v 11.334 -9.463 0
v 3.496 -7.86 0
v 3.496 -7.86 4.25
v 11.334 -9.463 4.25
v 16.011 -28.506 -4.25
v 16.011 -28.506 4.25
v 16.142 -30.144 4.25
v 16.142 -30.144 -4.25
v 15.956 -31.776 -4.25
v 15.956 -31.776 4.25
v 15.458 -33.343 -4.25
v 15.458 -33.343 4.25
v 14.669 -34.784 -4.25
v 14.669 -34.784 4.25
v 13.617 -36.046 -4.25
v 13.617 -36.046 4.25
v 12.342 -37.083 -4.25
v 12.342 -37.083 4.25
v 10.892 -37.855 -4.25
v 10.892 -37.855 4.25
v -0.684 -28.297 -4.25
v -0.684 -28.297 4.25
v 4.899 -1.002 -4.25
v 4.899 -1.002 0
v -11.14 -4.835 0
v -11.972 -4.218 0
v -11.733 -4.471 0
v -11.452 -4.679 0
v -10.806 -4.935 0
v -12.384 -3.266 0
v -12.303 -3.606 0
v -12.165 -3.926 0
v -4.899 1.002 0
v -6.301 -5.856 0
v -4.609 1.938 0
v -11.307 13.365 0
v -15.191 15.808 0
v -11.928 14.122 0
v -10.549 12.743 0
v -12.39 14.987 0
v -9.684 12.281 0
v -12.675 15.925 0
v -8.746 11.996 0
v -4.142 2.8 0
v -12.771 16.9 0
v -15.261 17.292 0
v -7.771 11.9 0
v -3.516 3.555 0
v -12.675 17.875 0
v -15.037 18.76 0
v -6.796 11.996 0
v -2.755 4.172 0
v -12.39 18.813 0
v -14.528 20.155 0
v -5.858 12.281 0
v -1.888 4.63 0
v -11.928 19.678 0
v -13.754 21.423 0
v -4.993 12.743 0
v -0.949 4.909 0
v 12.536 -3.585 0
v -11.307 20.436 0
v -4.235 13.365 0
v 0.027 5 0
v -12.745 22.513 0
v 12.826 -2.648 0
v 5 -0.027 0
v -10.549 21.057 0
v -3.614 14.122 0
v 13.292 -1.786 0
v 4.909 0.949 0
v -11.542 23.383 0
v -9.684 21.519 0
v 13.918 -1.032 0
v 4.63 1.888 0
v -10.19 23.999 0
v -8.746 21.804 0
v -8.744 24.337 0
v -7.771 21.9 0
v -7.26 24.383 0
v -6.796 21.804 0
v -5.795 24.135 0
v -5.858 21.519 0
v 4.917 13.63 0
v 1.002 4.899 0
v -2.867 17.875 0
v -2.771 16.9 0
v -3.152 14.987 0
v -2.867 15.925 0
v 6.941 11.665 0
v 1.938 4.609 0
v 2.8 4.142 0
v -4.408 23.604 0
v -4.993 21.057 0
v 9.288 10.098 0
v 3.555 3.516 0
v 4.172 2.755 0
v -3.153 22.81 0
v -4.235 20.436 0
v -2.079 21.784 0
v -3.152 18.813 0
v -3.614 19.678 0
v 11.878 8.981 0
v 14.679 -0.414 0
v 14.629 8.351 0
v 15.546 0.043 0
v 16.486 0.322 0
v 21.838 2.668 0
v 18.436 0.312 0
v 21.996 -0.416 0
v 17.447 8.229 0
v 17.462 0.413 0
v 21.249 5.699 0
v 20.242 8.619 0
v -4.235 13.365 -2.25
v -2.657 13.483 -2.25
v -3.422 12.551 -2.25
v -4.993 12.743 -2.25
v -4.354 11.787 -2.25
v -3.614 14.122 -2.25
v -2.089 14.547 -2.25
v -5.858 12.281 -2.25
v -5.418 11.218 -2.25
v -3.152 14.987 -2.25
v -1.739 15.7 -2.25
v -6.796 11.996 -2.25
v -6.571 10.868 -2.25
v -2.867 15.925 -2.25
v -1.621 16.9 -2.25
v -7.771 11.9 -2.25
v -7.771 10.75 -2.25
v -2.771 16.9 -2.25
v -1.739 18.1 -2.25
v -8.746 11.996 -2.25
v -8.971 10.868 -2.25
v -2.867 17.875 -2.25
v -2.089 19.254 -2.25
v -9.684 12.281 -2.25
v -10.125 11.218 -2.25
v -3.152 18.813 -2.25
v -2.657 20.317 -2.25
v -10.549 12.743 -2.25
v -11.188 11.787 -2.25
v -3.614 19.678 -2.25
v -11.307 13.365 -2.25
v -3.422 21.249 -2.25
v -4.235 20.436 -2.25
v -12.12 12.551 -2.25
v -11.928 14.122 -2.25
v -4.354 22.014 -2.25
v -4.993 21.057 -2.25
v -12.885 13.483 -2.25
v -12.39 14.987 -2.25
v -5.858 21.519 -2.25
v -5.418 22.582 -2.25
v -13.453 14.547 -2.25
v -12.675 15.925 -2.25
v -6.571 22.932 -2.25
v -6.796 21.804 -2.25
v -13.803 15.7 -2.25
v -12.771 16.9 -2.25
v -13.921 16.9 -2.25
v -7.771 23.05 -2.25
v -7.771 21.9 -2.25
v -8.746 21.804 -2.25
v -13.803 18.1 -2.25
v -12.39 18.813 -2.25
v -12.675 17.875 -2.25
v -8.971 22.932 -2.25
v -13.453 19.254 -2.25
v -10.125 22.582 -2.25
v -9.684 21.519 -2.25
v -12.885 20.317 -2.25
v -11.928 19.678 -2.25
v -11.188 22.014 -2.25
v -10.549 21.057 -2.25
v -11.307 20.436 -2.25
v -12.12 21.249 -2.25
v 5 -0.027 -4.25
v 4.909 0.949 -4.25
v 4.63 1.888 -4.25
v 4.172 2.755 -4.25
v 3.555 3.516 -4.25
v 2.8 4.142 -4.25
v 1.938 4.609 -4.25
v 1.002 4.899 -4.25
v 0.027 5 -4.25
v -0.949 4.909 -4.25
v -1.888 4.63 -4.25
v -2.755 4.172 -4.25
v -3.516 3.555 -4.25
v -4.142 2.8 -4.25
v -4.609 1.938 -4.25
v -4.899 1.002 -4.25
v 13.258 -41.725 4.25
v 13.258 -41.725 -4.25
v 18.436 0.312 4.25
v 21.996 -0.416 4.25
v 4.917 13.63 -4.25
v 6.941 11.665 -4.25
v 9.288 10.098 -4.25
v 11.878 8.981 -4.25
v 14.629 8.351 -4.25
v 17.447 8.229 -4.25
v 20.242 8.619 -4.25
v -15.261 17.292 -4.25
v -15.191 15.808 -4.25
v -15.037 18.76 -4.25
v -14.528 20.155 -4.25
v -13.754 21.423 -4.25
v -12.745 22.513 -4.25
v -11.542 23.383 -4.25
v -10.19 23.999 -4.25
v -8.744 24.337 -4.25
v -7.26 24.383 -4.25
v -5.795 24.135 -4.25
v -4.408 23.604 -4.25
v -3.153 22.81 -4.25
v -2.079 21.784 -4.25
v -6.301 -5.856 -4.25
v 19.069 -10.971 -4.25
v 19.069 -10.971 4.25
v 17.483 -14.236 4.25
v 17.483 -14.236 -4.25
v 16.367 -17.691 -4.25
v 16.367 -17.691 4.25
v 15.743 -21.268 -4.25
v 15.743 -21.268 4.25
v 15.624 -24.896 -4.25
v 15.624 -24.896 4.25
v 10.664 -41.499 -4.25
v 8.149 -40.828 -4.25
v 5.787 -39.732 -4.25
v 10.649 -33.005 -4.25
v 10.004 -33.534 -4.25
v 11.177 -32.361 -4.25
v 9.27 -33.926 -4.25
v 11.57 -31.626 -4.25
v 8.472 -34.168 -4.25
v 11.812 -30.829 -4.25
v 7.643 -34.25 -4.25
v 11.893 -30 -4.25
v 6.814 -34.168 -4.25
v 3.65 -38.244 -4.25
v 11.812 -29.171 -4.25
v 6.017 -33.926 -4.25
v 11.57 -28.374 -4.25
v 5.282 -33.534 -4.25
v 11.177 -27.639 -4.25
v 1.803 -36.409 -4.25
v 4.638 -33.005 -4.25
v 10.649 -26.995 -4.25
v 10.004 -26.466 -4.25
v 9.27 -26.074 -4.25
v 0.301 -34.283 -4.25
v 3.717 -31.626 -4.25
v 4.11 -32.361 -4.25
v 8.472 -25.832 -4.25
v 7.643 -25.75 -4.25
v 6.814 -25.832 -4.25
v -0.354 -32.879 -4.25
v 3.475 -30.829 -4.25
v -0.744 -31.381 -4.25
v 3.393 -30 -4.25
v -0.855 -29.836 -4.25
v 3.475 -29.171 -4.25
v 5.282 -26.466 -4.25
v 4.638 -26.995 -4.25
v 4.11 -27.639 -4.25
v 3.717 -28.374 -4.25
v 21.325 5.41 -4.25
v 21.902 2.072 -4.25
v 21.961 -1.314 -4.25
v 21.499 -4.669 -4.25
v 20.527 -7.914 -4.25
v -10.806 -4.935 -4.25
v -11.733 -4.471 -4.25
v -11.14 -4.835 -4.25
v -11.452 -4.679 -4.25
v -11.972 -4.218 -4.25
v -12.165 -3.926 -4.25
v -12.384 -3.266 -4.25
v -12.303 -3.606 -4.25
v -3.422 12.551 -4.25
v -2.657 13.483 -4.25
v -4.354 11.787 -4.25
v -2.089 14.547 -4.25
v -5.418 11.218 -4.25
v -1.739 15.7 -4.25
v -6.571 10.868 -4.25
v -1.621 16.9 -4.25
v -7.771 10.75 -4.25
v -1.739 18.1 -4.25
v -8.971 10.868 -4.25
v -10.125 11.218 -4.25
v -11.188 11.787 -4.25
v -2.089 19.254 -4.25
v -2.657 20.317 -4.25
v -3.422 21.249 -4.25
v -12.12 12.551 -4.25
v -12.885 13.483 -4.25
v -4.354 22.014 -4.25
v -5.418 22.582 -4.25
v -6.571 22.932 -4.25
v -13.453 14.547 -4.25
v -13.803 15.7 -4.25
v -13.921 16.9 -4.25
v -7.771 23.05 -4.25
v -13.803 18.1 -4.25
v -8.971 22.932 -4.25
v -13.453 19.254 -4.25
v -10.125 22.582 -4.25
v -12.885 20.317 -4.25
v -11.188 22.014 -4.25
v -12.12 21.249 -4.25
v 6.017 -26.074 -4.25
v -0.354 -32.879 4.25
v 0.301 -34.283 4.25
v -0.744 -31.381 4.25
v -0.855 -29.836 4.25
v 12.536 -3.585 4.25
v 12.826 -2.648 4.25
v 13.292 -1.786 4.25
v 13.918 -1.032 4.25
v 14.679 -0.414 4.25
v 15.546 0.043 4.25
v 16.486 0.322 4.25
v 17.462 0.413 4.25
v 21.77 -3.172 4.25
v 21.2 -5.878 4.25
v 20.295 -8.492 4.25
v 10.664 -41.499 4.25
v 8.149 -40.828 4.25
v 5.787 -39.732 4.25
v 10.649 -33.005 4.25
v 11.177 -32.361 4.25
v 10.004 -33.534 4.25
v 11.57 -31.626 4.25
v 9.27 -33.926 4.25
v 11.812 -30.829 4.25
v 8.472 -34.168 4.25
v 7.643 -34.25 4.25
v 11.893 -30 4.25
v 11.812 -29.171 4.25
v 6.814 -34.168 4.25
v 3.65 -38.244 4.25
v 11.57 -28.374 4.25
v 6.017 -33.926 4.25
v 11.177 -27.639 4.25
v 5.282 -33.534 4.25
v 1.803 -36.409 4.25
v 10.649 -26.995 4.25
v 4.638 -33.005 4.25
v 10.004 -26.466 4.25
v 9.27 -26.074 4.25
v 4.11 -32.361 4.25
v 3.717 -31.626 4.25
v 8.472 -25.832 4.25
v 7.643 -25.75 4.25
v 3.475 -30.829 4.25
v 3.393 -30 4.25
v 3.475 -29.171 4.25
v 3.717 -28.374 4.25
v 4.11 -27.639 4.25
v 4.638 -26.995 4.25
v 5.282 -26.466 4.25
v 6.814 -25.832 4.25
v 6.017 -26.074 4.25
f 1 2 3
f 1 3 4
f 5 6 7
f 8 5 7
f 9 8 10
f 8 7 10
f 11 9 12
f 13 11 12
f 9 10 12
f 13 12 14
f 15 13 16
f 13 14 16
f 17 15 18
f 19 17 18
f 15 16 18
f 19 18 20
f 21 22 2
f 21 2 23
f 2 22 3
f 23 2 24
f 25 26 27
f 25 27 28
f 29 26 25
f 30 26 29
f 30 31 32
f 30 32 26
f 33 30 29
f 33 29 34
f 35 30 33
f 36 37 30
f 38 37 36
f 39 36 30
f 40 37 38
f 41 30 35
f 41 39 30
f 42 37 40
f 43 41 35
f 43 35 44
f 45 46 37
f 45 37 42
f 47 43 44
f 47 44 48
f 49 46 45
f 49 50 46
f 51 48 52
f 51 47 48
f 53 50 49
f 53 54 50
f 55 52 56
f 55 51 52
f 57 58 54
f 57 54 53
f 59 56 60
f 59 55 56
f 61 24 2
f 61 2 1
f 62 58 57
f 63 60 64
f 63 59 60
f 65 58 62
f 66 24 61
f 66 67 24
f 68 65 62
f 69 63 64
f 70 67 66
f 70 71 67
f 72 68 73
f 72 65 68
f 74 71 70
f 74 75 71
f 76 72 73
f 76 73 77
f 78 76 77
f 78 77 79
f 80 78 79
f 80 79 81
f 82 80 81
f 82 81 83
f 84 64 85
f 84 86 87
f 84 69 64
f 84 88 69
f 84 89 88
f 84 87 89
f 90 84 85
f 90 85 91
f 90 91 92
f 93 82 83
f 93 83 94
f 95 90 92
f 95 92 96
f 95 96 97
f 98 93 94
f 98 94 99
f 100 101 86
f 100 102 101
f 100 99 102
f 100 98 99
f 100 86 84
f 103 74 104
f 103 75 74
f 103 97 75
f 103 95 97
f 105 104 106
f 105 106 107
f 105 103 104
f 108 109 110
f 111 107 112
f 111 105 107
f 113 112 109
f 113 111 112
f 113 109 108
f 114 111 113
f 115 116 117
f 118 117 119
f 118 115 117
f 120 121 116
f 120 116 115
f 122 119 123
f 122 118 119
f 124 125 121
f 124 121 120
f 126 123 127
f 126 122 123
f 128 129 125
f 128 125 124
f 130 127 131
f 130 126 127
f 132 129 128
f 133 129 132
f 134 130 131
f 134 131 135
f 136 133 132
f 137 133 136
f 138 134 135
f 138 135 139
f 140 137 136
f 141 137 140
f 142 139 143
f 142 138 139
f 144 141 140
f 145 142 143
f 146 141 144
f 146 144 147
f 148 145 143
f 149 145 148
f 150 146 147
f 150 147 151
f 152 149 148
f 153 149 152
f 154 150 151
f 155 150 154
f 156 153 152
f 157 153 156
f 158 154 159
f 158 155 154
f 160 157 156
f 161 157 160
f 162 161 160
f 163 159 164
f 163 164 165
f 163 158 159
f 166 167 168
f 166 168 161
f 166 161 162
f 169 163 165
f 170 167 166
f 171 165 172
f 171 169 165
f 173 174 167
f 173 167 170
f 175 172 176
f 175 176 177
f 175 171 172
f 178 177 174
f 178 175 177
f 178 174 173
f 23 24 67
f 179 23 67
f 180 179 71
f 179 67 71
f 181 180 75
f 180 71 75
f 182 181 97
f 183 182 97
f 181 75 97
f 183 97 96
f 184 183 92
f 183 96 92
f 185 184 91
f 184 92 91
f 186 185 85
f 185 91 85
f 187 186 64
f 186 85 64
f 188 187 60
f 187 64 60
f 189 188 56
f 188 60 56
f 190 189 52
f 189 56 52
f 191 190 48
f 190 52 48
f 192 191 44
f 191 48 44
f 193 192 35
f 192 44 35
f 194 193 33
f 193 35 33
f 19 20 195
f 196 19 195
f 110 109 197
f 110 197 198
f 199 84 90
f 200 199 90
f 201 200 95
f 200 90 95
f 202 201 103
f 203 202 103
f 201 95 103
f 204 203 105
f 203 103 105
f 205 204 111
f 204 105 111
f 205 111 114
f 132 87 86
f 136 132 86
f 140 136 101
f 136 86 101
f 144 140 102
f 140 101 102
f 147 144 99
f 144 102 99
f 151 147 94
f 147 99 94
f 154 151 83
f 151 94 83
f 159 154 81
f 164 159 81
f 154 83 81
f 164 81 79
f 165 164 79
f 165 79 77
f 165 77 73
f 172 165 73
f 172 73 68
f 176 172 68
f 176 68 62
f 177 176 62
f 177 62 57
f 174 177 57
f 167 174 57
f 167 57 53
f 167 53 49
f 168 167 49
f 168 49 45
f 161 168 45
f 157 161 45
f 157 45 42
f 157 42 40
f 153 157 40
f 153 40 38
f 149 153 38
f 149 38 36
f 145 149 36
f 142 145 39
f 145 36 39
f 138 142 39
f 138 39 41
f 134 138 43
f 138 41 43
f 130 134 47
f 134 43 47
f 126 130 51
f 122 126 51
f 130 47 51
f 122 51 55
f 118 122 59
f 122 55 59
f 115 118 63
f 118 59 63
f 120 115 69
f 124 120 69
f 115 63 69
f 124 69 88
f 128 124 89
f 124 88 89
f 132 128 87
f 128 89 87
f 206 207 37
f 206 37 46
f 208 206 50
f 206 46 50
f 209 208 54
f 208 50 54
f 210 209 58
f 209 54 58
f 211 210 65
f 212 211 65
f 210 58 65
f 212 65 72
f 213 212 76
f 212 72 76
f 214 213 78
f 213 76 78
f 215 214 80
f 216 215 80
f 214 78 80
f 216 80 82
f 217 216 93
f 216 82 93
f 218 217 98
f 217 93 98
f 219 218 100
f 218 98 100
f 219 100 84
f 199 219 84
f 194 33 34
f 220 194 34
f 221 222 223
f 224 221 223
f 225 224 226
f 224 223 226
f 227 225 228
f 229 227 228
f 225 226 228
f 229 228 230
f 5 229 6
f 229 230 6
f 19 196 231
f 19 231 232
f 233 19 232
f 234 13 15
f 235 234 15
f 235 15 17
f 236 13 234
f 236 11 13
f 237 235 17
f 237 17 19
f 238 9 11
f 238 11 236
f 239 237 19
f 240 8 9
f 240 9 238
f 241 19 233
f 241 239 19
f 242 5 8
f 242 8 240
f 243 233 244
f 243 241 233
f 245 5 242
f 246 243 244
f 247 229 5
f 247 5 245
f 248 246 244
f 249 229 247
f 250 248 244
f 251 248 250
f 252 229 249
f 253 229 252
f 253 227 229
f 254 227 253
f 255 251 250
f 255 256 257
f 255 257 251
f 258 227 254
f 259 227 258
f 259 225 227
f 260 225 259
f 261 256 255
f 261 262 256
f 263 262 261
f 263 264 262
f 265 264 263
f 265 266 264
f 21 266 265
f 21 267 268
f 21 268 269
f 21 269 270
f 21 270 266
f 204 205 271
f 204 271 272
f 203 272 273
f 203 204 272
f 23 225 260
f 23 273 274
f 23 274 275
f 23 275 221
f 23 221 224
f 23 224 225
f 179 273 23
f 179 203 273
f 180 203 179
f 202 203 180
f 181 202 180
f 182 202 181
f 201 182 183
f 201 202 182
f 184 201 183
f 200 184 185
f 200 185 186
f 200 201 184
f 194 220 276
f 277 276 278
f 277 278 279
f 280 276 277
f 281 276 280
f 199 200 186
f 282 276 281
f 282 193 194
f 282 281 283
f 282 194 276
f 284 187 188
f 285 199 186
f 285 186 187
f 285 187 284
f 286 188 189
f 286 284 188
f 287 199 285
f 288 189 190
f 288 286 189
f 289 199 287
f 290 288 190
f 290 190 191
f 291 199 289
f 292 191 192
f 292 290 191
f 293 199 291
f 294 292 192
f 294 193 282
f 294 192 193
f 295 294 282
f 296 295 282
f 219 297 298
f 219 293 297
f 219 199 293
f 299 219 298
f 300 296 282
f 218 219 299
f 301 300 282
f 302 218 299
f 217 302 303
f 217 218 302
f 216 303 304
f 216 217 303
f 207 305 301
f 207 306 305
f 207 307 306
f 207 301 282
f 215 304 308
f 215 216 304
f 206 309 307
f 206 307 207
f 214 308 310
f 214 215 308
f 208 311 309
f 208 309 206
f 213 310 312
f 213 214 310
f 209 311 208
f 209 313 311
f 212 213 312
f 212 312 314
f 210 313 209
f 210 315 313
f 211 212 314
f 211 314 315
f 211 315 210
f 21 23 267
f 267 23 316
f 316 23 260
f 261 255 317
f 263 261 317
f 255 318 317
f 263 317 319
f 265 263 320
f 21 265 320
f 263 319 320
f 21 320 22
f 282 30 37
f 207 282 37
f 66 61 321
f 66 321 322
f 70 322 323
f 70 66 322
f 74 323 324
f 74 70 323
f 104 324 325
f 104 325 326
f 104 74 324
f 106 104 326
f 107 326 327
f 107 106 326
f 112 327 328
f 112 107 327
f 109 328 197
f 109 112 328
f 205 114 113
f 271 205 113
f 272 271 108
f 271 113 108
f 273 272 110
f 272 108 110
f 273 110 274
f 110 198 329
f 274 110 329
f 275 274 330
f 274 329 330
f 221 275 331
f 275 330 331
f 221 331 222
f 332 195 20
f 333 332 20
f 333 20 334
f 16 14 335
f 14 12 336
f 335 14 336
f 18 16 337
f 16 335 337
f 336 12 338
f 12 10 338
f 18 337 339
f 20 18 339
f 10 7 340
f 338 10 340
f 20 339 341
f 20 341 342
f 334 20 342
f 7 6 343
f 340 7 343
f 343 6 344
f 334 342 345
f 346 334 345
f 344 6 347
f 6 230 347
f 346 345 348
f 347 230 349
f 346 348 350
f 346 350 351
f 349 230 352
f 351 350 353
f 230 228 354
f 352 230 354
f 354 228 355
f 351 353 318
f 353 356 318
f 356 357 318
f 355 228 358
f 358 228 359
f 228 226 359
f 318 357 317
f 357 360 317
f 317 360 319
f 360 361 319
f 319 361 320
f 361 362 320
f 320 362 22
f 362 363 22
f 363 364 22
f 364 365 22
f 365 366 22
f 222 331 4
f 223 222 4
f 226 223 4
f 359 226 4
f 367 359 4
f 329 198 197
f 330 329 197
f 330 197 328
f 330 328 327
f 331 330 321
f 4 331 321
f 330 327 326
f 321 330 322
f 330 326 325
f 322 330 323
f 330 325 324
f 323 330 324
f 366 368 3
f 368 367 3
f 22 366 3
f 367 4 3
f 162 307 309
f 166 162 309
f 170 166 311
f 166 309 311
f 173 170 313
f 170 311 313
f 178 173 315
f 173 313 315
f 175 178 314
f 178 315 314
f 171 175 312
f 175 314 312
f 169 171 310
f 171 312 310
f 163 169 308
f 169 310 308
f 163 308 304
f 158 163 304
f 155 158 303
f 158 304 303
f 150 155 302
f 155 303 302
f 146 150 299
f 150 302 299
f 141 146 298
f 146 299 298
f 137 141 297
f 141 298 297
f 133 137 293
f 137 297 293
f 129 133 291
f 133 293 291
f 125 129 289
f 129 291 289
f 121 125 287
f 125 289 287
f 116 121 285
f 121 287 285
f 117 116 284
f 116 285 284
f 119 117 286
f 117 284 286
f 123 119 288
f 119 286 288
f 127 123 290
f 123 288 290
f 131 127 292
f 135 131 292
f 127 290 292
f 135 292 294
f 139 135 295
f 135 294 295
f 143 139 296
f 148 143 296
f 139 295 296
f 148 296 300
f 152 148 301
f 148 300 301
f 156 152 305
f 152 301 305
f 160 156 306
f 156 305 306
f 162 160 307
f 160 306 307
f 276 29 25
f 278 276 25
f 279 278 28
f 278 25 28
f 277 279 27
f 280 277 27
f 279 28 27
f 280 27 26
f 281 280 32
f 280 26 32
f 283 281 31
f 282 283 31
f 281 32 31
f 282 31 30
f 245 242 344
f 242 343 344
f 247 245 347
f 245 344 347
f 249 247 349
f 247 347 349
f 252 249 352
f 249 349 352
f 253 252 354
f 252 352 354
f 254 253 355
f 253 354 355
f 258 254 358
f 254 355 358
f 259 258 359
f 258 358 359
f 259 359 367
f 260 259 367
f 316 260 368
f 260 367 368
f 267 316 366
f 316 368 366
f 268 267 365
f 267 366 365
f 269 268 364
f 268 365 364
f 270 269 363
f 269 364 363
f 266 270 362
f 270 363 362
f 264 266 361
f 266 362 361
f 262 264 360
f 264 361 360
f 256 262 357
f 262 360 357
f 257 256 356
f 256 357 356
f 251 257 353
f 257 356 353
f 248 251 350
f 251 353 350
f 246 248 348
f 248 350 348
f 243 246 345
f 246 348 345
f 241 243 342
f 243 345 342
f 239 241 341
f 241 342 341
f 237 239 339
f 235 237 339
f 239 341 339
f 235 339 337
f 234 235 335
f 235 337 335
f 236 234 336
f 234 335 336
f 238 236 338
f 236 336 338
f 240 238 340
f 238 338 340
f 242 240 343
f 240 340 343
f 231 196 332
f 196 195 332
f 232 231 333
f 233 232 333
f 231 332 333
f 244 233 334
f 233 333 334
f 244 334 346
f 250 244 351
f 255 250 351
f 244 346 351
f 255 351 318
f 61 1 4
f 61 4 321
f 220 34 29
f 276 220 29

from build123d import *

# Parameters (mm, degrees)
EXTRUSION12_DEPTH             = 4.25
ENL_V_MAT_EXTRU_13_DEPTH      = 5.25
ESQUISSE35_R                  = 5
ESQUISSE35_R_2                = 4.25
ENL_V_MAT_EXTRU_14_DEPTH      = 5.25
ENL_V_MAT_EXTRU_14_DEPTH_BACK = 5.25
ESQUISSE36_R                  = 6.15
ENL_V_MAT_EXTRU_15_DEPTH      = 2


with BuildPart() as part:
    # Esquisse33 → Extrusion12 (new body, symmetric)
    with BuildSketch(Plane.XY):
        with BuildLine():
            Line((10.891822315, -37.854750679), (13.257957999, -41.725))
            ThreePointArc((13.257957999, -41.725), (5.786859841, -39.732024729), (0.301056866, -34.282692308))
            ThreePointArc((0.301056866, -34.282692308), (-0.743831674, -31.380582548), (-0.684284829, -28.296674752))
            Line((-0.684284829, -28.296674752), (4.898579806, -1.001956028))
            ThreePointArc((4.898579806, -1.001956028), (1.001956028, 4.898579806), (-4.898579806, 1.001956028))
            Line((-4.898579806, 1.001956028), (-6.301318246, -5.8560557))
            Line((-6.301318246, -5.8560557), (-10.805878352, -4.934692503))
            ThreePointArc((-10.805878352, -4.934692503), (-11.858094208, -4.349595341), (-12.383780945, -3.266474687))
            Line((-12.383780945, -3.266474687), (-15.191076253, 15.807989781))
            ThreePointArc((-15.191076253, 15.807989781), (-10.881496713, 23.724620088), (-2.079236513, 21.784072078))
            Line((-2.079236513, 21.784072078), (4.917258536, 13.630466886))
            ThreePointArc((4.917258536, 13.630466886), (11.878383999, 8.981113225), (20.241537521, 8.618593782))
            ThreePointArc((20.241537521, 8.618593782), (21.960728113, -1.313933303), (19.069494762, -10.970613909))
            ThreePointArc((19.069494762, -10.970613909), (15.992864342, -19.46838522), (16.010964353, -28.505942654))
            ThreePointArc((16.010964353, -28.505942654), (15.098768048, -34.082402323), (10.891822315, -37.854750679))
        make_face()
    extrude(amount=EXTRUSION12_DEPTH, both=True)

    # Esquisse34 → Enlèv. mat.-Extru.13 (cut, through all)
    with BuildSketch(Plane.XY):
        with BuildLine():
            Line((4.898579806, -1.001956028), (3.495841367, -7.859967757))
            Line((3.495841367, -7.859967757), (11.333569057, -9.463097402))
            Line((11.333569057, -9.463097402), (12.53591629, -3.584801635))
            ThreePointArc((12.53591629, -3.584801635), (14.679166999, -0.414448762), (18.436452125, 0.311822143))
            Line((18.436452125, 0.311822143), (21.996061624, -0.416260758))
            ThreePointArc((21.996061624, -0.416260758), (21.596547051, 4.193942712), (20.241537521, 8.618593782))
            ThreePointArc((20.241537521, 8.618593782), (11.878383999, 8.981113225), (4.917258536, 13.630466886))
            Line((4.917258536, 13.630466886), (-2.079236513, 21.784072078))
            ThreePointArc((-2.079236513, 21.784072078), (-10.881496713, 23.724620088), (-15.191076253, 15.807989781))
            Line((-15.191076253, 15.807989781), (-12.383780945, -3.266474687))
            ThreePointArc((-12.383780945, -3.266474687), (-11.858094208, -4.349595341), (-10.805878352, -4.934692503))
            Line((-10.805878352, -4.934692503), (-6.301318246, -5.8560557))
            Line((-6.301318246, -5.8560557), (-4.898579806, 1.001956028))
            ThreePointArc((-4.898579806, 1.001956028), (1.001956028, 4.898579806), (4.898579806, -1.001956028))
        make_face()
    extrude(amount=ENL_V_MAT_EXTRU_13_DEPTH, mode=Mode.SUBTRACT)

    # Esquisse35 → Enlèv. mat.-Extru.14 (cut, two sides)
    with BuildSketch(Plane.XY) as enl_v_mat_extru_14_sk:
        with Locations((-7.771007489, 16.900042681)):
            Circle(ESQUISSE35_R)
        with Locations((7.643300841, -30)):
            Circle(ESQUISSE35_R_2)
    extrude(amount=ENL_V_MAT_EXTRU_14_DEPTH, mode=Mode.SUBTRACT)
    extrude(enl_v_mat_extru_14_sk.sketch, amount=-ENL_V_MAT_EXTRU_14_DEPTH_BACK, mode=Mode.SUBTRACT)

    # Esquisse36 → Enlèv. mat.-Extru.15 (cut)
    with BuildSketch(Plane(origin=(0, 0, -4.25), x_dir=(-1, 0, 0), z_dir=(0, 0, -1))):
        with Locations((7.771007489, 16.900042681)):
            Circle(ESQUISSE36_R)
    extrude(amount=-ENL_V_MAT_EXTRU_15_DEPTH, mode=Mode.SUBTRACT)


solid = part.part
